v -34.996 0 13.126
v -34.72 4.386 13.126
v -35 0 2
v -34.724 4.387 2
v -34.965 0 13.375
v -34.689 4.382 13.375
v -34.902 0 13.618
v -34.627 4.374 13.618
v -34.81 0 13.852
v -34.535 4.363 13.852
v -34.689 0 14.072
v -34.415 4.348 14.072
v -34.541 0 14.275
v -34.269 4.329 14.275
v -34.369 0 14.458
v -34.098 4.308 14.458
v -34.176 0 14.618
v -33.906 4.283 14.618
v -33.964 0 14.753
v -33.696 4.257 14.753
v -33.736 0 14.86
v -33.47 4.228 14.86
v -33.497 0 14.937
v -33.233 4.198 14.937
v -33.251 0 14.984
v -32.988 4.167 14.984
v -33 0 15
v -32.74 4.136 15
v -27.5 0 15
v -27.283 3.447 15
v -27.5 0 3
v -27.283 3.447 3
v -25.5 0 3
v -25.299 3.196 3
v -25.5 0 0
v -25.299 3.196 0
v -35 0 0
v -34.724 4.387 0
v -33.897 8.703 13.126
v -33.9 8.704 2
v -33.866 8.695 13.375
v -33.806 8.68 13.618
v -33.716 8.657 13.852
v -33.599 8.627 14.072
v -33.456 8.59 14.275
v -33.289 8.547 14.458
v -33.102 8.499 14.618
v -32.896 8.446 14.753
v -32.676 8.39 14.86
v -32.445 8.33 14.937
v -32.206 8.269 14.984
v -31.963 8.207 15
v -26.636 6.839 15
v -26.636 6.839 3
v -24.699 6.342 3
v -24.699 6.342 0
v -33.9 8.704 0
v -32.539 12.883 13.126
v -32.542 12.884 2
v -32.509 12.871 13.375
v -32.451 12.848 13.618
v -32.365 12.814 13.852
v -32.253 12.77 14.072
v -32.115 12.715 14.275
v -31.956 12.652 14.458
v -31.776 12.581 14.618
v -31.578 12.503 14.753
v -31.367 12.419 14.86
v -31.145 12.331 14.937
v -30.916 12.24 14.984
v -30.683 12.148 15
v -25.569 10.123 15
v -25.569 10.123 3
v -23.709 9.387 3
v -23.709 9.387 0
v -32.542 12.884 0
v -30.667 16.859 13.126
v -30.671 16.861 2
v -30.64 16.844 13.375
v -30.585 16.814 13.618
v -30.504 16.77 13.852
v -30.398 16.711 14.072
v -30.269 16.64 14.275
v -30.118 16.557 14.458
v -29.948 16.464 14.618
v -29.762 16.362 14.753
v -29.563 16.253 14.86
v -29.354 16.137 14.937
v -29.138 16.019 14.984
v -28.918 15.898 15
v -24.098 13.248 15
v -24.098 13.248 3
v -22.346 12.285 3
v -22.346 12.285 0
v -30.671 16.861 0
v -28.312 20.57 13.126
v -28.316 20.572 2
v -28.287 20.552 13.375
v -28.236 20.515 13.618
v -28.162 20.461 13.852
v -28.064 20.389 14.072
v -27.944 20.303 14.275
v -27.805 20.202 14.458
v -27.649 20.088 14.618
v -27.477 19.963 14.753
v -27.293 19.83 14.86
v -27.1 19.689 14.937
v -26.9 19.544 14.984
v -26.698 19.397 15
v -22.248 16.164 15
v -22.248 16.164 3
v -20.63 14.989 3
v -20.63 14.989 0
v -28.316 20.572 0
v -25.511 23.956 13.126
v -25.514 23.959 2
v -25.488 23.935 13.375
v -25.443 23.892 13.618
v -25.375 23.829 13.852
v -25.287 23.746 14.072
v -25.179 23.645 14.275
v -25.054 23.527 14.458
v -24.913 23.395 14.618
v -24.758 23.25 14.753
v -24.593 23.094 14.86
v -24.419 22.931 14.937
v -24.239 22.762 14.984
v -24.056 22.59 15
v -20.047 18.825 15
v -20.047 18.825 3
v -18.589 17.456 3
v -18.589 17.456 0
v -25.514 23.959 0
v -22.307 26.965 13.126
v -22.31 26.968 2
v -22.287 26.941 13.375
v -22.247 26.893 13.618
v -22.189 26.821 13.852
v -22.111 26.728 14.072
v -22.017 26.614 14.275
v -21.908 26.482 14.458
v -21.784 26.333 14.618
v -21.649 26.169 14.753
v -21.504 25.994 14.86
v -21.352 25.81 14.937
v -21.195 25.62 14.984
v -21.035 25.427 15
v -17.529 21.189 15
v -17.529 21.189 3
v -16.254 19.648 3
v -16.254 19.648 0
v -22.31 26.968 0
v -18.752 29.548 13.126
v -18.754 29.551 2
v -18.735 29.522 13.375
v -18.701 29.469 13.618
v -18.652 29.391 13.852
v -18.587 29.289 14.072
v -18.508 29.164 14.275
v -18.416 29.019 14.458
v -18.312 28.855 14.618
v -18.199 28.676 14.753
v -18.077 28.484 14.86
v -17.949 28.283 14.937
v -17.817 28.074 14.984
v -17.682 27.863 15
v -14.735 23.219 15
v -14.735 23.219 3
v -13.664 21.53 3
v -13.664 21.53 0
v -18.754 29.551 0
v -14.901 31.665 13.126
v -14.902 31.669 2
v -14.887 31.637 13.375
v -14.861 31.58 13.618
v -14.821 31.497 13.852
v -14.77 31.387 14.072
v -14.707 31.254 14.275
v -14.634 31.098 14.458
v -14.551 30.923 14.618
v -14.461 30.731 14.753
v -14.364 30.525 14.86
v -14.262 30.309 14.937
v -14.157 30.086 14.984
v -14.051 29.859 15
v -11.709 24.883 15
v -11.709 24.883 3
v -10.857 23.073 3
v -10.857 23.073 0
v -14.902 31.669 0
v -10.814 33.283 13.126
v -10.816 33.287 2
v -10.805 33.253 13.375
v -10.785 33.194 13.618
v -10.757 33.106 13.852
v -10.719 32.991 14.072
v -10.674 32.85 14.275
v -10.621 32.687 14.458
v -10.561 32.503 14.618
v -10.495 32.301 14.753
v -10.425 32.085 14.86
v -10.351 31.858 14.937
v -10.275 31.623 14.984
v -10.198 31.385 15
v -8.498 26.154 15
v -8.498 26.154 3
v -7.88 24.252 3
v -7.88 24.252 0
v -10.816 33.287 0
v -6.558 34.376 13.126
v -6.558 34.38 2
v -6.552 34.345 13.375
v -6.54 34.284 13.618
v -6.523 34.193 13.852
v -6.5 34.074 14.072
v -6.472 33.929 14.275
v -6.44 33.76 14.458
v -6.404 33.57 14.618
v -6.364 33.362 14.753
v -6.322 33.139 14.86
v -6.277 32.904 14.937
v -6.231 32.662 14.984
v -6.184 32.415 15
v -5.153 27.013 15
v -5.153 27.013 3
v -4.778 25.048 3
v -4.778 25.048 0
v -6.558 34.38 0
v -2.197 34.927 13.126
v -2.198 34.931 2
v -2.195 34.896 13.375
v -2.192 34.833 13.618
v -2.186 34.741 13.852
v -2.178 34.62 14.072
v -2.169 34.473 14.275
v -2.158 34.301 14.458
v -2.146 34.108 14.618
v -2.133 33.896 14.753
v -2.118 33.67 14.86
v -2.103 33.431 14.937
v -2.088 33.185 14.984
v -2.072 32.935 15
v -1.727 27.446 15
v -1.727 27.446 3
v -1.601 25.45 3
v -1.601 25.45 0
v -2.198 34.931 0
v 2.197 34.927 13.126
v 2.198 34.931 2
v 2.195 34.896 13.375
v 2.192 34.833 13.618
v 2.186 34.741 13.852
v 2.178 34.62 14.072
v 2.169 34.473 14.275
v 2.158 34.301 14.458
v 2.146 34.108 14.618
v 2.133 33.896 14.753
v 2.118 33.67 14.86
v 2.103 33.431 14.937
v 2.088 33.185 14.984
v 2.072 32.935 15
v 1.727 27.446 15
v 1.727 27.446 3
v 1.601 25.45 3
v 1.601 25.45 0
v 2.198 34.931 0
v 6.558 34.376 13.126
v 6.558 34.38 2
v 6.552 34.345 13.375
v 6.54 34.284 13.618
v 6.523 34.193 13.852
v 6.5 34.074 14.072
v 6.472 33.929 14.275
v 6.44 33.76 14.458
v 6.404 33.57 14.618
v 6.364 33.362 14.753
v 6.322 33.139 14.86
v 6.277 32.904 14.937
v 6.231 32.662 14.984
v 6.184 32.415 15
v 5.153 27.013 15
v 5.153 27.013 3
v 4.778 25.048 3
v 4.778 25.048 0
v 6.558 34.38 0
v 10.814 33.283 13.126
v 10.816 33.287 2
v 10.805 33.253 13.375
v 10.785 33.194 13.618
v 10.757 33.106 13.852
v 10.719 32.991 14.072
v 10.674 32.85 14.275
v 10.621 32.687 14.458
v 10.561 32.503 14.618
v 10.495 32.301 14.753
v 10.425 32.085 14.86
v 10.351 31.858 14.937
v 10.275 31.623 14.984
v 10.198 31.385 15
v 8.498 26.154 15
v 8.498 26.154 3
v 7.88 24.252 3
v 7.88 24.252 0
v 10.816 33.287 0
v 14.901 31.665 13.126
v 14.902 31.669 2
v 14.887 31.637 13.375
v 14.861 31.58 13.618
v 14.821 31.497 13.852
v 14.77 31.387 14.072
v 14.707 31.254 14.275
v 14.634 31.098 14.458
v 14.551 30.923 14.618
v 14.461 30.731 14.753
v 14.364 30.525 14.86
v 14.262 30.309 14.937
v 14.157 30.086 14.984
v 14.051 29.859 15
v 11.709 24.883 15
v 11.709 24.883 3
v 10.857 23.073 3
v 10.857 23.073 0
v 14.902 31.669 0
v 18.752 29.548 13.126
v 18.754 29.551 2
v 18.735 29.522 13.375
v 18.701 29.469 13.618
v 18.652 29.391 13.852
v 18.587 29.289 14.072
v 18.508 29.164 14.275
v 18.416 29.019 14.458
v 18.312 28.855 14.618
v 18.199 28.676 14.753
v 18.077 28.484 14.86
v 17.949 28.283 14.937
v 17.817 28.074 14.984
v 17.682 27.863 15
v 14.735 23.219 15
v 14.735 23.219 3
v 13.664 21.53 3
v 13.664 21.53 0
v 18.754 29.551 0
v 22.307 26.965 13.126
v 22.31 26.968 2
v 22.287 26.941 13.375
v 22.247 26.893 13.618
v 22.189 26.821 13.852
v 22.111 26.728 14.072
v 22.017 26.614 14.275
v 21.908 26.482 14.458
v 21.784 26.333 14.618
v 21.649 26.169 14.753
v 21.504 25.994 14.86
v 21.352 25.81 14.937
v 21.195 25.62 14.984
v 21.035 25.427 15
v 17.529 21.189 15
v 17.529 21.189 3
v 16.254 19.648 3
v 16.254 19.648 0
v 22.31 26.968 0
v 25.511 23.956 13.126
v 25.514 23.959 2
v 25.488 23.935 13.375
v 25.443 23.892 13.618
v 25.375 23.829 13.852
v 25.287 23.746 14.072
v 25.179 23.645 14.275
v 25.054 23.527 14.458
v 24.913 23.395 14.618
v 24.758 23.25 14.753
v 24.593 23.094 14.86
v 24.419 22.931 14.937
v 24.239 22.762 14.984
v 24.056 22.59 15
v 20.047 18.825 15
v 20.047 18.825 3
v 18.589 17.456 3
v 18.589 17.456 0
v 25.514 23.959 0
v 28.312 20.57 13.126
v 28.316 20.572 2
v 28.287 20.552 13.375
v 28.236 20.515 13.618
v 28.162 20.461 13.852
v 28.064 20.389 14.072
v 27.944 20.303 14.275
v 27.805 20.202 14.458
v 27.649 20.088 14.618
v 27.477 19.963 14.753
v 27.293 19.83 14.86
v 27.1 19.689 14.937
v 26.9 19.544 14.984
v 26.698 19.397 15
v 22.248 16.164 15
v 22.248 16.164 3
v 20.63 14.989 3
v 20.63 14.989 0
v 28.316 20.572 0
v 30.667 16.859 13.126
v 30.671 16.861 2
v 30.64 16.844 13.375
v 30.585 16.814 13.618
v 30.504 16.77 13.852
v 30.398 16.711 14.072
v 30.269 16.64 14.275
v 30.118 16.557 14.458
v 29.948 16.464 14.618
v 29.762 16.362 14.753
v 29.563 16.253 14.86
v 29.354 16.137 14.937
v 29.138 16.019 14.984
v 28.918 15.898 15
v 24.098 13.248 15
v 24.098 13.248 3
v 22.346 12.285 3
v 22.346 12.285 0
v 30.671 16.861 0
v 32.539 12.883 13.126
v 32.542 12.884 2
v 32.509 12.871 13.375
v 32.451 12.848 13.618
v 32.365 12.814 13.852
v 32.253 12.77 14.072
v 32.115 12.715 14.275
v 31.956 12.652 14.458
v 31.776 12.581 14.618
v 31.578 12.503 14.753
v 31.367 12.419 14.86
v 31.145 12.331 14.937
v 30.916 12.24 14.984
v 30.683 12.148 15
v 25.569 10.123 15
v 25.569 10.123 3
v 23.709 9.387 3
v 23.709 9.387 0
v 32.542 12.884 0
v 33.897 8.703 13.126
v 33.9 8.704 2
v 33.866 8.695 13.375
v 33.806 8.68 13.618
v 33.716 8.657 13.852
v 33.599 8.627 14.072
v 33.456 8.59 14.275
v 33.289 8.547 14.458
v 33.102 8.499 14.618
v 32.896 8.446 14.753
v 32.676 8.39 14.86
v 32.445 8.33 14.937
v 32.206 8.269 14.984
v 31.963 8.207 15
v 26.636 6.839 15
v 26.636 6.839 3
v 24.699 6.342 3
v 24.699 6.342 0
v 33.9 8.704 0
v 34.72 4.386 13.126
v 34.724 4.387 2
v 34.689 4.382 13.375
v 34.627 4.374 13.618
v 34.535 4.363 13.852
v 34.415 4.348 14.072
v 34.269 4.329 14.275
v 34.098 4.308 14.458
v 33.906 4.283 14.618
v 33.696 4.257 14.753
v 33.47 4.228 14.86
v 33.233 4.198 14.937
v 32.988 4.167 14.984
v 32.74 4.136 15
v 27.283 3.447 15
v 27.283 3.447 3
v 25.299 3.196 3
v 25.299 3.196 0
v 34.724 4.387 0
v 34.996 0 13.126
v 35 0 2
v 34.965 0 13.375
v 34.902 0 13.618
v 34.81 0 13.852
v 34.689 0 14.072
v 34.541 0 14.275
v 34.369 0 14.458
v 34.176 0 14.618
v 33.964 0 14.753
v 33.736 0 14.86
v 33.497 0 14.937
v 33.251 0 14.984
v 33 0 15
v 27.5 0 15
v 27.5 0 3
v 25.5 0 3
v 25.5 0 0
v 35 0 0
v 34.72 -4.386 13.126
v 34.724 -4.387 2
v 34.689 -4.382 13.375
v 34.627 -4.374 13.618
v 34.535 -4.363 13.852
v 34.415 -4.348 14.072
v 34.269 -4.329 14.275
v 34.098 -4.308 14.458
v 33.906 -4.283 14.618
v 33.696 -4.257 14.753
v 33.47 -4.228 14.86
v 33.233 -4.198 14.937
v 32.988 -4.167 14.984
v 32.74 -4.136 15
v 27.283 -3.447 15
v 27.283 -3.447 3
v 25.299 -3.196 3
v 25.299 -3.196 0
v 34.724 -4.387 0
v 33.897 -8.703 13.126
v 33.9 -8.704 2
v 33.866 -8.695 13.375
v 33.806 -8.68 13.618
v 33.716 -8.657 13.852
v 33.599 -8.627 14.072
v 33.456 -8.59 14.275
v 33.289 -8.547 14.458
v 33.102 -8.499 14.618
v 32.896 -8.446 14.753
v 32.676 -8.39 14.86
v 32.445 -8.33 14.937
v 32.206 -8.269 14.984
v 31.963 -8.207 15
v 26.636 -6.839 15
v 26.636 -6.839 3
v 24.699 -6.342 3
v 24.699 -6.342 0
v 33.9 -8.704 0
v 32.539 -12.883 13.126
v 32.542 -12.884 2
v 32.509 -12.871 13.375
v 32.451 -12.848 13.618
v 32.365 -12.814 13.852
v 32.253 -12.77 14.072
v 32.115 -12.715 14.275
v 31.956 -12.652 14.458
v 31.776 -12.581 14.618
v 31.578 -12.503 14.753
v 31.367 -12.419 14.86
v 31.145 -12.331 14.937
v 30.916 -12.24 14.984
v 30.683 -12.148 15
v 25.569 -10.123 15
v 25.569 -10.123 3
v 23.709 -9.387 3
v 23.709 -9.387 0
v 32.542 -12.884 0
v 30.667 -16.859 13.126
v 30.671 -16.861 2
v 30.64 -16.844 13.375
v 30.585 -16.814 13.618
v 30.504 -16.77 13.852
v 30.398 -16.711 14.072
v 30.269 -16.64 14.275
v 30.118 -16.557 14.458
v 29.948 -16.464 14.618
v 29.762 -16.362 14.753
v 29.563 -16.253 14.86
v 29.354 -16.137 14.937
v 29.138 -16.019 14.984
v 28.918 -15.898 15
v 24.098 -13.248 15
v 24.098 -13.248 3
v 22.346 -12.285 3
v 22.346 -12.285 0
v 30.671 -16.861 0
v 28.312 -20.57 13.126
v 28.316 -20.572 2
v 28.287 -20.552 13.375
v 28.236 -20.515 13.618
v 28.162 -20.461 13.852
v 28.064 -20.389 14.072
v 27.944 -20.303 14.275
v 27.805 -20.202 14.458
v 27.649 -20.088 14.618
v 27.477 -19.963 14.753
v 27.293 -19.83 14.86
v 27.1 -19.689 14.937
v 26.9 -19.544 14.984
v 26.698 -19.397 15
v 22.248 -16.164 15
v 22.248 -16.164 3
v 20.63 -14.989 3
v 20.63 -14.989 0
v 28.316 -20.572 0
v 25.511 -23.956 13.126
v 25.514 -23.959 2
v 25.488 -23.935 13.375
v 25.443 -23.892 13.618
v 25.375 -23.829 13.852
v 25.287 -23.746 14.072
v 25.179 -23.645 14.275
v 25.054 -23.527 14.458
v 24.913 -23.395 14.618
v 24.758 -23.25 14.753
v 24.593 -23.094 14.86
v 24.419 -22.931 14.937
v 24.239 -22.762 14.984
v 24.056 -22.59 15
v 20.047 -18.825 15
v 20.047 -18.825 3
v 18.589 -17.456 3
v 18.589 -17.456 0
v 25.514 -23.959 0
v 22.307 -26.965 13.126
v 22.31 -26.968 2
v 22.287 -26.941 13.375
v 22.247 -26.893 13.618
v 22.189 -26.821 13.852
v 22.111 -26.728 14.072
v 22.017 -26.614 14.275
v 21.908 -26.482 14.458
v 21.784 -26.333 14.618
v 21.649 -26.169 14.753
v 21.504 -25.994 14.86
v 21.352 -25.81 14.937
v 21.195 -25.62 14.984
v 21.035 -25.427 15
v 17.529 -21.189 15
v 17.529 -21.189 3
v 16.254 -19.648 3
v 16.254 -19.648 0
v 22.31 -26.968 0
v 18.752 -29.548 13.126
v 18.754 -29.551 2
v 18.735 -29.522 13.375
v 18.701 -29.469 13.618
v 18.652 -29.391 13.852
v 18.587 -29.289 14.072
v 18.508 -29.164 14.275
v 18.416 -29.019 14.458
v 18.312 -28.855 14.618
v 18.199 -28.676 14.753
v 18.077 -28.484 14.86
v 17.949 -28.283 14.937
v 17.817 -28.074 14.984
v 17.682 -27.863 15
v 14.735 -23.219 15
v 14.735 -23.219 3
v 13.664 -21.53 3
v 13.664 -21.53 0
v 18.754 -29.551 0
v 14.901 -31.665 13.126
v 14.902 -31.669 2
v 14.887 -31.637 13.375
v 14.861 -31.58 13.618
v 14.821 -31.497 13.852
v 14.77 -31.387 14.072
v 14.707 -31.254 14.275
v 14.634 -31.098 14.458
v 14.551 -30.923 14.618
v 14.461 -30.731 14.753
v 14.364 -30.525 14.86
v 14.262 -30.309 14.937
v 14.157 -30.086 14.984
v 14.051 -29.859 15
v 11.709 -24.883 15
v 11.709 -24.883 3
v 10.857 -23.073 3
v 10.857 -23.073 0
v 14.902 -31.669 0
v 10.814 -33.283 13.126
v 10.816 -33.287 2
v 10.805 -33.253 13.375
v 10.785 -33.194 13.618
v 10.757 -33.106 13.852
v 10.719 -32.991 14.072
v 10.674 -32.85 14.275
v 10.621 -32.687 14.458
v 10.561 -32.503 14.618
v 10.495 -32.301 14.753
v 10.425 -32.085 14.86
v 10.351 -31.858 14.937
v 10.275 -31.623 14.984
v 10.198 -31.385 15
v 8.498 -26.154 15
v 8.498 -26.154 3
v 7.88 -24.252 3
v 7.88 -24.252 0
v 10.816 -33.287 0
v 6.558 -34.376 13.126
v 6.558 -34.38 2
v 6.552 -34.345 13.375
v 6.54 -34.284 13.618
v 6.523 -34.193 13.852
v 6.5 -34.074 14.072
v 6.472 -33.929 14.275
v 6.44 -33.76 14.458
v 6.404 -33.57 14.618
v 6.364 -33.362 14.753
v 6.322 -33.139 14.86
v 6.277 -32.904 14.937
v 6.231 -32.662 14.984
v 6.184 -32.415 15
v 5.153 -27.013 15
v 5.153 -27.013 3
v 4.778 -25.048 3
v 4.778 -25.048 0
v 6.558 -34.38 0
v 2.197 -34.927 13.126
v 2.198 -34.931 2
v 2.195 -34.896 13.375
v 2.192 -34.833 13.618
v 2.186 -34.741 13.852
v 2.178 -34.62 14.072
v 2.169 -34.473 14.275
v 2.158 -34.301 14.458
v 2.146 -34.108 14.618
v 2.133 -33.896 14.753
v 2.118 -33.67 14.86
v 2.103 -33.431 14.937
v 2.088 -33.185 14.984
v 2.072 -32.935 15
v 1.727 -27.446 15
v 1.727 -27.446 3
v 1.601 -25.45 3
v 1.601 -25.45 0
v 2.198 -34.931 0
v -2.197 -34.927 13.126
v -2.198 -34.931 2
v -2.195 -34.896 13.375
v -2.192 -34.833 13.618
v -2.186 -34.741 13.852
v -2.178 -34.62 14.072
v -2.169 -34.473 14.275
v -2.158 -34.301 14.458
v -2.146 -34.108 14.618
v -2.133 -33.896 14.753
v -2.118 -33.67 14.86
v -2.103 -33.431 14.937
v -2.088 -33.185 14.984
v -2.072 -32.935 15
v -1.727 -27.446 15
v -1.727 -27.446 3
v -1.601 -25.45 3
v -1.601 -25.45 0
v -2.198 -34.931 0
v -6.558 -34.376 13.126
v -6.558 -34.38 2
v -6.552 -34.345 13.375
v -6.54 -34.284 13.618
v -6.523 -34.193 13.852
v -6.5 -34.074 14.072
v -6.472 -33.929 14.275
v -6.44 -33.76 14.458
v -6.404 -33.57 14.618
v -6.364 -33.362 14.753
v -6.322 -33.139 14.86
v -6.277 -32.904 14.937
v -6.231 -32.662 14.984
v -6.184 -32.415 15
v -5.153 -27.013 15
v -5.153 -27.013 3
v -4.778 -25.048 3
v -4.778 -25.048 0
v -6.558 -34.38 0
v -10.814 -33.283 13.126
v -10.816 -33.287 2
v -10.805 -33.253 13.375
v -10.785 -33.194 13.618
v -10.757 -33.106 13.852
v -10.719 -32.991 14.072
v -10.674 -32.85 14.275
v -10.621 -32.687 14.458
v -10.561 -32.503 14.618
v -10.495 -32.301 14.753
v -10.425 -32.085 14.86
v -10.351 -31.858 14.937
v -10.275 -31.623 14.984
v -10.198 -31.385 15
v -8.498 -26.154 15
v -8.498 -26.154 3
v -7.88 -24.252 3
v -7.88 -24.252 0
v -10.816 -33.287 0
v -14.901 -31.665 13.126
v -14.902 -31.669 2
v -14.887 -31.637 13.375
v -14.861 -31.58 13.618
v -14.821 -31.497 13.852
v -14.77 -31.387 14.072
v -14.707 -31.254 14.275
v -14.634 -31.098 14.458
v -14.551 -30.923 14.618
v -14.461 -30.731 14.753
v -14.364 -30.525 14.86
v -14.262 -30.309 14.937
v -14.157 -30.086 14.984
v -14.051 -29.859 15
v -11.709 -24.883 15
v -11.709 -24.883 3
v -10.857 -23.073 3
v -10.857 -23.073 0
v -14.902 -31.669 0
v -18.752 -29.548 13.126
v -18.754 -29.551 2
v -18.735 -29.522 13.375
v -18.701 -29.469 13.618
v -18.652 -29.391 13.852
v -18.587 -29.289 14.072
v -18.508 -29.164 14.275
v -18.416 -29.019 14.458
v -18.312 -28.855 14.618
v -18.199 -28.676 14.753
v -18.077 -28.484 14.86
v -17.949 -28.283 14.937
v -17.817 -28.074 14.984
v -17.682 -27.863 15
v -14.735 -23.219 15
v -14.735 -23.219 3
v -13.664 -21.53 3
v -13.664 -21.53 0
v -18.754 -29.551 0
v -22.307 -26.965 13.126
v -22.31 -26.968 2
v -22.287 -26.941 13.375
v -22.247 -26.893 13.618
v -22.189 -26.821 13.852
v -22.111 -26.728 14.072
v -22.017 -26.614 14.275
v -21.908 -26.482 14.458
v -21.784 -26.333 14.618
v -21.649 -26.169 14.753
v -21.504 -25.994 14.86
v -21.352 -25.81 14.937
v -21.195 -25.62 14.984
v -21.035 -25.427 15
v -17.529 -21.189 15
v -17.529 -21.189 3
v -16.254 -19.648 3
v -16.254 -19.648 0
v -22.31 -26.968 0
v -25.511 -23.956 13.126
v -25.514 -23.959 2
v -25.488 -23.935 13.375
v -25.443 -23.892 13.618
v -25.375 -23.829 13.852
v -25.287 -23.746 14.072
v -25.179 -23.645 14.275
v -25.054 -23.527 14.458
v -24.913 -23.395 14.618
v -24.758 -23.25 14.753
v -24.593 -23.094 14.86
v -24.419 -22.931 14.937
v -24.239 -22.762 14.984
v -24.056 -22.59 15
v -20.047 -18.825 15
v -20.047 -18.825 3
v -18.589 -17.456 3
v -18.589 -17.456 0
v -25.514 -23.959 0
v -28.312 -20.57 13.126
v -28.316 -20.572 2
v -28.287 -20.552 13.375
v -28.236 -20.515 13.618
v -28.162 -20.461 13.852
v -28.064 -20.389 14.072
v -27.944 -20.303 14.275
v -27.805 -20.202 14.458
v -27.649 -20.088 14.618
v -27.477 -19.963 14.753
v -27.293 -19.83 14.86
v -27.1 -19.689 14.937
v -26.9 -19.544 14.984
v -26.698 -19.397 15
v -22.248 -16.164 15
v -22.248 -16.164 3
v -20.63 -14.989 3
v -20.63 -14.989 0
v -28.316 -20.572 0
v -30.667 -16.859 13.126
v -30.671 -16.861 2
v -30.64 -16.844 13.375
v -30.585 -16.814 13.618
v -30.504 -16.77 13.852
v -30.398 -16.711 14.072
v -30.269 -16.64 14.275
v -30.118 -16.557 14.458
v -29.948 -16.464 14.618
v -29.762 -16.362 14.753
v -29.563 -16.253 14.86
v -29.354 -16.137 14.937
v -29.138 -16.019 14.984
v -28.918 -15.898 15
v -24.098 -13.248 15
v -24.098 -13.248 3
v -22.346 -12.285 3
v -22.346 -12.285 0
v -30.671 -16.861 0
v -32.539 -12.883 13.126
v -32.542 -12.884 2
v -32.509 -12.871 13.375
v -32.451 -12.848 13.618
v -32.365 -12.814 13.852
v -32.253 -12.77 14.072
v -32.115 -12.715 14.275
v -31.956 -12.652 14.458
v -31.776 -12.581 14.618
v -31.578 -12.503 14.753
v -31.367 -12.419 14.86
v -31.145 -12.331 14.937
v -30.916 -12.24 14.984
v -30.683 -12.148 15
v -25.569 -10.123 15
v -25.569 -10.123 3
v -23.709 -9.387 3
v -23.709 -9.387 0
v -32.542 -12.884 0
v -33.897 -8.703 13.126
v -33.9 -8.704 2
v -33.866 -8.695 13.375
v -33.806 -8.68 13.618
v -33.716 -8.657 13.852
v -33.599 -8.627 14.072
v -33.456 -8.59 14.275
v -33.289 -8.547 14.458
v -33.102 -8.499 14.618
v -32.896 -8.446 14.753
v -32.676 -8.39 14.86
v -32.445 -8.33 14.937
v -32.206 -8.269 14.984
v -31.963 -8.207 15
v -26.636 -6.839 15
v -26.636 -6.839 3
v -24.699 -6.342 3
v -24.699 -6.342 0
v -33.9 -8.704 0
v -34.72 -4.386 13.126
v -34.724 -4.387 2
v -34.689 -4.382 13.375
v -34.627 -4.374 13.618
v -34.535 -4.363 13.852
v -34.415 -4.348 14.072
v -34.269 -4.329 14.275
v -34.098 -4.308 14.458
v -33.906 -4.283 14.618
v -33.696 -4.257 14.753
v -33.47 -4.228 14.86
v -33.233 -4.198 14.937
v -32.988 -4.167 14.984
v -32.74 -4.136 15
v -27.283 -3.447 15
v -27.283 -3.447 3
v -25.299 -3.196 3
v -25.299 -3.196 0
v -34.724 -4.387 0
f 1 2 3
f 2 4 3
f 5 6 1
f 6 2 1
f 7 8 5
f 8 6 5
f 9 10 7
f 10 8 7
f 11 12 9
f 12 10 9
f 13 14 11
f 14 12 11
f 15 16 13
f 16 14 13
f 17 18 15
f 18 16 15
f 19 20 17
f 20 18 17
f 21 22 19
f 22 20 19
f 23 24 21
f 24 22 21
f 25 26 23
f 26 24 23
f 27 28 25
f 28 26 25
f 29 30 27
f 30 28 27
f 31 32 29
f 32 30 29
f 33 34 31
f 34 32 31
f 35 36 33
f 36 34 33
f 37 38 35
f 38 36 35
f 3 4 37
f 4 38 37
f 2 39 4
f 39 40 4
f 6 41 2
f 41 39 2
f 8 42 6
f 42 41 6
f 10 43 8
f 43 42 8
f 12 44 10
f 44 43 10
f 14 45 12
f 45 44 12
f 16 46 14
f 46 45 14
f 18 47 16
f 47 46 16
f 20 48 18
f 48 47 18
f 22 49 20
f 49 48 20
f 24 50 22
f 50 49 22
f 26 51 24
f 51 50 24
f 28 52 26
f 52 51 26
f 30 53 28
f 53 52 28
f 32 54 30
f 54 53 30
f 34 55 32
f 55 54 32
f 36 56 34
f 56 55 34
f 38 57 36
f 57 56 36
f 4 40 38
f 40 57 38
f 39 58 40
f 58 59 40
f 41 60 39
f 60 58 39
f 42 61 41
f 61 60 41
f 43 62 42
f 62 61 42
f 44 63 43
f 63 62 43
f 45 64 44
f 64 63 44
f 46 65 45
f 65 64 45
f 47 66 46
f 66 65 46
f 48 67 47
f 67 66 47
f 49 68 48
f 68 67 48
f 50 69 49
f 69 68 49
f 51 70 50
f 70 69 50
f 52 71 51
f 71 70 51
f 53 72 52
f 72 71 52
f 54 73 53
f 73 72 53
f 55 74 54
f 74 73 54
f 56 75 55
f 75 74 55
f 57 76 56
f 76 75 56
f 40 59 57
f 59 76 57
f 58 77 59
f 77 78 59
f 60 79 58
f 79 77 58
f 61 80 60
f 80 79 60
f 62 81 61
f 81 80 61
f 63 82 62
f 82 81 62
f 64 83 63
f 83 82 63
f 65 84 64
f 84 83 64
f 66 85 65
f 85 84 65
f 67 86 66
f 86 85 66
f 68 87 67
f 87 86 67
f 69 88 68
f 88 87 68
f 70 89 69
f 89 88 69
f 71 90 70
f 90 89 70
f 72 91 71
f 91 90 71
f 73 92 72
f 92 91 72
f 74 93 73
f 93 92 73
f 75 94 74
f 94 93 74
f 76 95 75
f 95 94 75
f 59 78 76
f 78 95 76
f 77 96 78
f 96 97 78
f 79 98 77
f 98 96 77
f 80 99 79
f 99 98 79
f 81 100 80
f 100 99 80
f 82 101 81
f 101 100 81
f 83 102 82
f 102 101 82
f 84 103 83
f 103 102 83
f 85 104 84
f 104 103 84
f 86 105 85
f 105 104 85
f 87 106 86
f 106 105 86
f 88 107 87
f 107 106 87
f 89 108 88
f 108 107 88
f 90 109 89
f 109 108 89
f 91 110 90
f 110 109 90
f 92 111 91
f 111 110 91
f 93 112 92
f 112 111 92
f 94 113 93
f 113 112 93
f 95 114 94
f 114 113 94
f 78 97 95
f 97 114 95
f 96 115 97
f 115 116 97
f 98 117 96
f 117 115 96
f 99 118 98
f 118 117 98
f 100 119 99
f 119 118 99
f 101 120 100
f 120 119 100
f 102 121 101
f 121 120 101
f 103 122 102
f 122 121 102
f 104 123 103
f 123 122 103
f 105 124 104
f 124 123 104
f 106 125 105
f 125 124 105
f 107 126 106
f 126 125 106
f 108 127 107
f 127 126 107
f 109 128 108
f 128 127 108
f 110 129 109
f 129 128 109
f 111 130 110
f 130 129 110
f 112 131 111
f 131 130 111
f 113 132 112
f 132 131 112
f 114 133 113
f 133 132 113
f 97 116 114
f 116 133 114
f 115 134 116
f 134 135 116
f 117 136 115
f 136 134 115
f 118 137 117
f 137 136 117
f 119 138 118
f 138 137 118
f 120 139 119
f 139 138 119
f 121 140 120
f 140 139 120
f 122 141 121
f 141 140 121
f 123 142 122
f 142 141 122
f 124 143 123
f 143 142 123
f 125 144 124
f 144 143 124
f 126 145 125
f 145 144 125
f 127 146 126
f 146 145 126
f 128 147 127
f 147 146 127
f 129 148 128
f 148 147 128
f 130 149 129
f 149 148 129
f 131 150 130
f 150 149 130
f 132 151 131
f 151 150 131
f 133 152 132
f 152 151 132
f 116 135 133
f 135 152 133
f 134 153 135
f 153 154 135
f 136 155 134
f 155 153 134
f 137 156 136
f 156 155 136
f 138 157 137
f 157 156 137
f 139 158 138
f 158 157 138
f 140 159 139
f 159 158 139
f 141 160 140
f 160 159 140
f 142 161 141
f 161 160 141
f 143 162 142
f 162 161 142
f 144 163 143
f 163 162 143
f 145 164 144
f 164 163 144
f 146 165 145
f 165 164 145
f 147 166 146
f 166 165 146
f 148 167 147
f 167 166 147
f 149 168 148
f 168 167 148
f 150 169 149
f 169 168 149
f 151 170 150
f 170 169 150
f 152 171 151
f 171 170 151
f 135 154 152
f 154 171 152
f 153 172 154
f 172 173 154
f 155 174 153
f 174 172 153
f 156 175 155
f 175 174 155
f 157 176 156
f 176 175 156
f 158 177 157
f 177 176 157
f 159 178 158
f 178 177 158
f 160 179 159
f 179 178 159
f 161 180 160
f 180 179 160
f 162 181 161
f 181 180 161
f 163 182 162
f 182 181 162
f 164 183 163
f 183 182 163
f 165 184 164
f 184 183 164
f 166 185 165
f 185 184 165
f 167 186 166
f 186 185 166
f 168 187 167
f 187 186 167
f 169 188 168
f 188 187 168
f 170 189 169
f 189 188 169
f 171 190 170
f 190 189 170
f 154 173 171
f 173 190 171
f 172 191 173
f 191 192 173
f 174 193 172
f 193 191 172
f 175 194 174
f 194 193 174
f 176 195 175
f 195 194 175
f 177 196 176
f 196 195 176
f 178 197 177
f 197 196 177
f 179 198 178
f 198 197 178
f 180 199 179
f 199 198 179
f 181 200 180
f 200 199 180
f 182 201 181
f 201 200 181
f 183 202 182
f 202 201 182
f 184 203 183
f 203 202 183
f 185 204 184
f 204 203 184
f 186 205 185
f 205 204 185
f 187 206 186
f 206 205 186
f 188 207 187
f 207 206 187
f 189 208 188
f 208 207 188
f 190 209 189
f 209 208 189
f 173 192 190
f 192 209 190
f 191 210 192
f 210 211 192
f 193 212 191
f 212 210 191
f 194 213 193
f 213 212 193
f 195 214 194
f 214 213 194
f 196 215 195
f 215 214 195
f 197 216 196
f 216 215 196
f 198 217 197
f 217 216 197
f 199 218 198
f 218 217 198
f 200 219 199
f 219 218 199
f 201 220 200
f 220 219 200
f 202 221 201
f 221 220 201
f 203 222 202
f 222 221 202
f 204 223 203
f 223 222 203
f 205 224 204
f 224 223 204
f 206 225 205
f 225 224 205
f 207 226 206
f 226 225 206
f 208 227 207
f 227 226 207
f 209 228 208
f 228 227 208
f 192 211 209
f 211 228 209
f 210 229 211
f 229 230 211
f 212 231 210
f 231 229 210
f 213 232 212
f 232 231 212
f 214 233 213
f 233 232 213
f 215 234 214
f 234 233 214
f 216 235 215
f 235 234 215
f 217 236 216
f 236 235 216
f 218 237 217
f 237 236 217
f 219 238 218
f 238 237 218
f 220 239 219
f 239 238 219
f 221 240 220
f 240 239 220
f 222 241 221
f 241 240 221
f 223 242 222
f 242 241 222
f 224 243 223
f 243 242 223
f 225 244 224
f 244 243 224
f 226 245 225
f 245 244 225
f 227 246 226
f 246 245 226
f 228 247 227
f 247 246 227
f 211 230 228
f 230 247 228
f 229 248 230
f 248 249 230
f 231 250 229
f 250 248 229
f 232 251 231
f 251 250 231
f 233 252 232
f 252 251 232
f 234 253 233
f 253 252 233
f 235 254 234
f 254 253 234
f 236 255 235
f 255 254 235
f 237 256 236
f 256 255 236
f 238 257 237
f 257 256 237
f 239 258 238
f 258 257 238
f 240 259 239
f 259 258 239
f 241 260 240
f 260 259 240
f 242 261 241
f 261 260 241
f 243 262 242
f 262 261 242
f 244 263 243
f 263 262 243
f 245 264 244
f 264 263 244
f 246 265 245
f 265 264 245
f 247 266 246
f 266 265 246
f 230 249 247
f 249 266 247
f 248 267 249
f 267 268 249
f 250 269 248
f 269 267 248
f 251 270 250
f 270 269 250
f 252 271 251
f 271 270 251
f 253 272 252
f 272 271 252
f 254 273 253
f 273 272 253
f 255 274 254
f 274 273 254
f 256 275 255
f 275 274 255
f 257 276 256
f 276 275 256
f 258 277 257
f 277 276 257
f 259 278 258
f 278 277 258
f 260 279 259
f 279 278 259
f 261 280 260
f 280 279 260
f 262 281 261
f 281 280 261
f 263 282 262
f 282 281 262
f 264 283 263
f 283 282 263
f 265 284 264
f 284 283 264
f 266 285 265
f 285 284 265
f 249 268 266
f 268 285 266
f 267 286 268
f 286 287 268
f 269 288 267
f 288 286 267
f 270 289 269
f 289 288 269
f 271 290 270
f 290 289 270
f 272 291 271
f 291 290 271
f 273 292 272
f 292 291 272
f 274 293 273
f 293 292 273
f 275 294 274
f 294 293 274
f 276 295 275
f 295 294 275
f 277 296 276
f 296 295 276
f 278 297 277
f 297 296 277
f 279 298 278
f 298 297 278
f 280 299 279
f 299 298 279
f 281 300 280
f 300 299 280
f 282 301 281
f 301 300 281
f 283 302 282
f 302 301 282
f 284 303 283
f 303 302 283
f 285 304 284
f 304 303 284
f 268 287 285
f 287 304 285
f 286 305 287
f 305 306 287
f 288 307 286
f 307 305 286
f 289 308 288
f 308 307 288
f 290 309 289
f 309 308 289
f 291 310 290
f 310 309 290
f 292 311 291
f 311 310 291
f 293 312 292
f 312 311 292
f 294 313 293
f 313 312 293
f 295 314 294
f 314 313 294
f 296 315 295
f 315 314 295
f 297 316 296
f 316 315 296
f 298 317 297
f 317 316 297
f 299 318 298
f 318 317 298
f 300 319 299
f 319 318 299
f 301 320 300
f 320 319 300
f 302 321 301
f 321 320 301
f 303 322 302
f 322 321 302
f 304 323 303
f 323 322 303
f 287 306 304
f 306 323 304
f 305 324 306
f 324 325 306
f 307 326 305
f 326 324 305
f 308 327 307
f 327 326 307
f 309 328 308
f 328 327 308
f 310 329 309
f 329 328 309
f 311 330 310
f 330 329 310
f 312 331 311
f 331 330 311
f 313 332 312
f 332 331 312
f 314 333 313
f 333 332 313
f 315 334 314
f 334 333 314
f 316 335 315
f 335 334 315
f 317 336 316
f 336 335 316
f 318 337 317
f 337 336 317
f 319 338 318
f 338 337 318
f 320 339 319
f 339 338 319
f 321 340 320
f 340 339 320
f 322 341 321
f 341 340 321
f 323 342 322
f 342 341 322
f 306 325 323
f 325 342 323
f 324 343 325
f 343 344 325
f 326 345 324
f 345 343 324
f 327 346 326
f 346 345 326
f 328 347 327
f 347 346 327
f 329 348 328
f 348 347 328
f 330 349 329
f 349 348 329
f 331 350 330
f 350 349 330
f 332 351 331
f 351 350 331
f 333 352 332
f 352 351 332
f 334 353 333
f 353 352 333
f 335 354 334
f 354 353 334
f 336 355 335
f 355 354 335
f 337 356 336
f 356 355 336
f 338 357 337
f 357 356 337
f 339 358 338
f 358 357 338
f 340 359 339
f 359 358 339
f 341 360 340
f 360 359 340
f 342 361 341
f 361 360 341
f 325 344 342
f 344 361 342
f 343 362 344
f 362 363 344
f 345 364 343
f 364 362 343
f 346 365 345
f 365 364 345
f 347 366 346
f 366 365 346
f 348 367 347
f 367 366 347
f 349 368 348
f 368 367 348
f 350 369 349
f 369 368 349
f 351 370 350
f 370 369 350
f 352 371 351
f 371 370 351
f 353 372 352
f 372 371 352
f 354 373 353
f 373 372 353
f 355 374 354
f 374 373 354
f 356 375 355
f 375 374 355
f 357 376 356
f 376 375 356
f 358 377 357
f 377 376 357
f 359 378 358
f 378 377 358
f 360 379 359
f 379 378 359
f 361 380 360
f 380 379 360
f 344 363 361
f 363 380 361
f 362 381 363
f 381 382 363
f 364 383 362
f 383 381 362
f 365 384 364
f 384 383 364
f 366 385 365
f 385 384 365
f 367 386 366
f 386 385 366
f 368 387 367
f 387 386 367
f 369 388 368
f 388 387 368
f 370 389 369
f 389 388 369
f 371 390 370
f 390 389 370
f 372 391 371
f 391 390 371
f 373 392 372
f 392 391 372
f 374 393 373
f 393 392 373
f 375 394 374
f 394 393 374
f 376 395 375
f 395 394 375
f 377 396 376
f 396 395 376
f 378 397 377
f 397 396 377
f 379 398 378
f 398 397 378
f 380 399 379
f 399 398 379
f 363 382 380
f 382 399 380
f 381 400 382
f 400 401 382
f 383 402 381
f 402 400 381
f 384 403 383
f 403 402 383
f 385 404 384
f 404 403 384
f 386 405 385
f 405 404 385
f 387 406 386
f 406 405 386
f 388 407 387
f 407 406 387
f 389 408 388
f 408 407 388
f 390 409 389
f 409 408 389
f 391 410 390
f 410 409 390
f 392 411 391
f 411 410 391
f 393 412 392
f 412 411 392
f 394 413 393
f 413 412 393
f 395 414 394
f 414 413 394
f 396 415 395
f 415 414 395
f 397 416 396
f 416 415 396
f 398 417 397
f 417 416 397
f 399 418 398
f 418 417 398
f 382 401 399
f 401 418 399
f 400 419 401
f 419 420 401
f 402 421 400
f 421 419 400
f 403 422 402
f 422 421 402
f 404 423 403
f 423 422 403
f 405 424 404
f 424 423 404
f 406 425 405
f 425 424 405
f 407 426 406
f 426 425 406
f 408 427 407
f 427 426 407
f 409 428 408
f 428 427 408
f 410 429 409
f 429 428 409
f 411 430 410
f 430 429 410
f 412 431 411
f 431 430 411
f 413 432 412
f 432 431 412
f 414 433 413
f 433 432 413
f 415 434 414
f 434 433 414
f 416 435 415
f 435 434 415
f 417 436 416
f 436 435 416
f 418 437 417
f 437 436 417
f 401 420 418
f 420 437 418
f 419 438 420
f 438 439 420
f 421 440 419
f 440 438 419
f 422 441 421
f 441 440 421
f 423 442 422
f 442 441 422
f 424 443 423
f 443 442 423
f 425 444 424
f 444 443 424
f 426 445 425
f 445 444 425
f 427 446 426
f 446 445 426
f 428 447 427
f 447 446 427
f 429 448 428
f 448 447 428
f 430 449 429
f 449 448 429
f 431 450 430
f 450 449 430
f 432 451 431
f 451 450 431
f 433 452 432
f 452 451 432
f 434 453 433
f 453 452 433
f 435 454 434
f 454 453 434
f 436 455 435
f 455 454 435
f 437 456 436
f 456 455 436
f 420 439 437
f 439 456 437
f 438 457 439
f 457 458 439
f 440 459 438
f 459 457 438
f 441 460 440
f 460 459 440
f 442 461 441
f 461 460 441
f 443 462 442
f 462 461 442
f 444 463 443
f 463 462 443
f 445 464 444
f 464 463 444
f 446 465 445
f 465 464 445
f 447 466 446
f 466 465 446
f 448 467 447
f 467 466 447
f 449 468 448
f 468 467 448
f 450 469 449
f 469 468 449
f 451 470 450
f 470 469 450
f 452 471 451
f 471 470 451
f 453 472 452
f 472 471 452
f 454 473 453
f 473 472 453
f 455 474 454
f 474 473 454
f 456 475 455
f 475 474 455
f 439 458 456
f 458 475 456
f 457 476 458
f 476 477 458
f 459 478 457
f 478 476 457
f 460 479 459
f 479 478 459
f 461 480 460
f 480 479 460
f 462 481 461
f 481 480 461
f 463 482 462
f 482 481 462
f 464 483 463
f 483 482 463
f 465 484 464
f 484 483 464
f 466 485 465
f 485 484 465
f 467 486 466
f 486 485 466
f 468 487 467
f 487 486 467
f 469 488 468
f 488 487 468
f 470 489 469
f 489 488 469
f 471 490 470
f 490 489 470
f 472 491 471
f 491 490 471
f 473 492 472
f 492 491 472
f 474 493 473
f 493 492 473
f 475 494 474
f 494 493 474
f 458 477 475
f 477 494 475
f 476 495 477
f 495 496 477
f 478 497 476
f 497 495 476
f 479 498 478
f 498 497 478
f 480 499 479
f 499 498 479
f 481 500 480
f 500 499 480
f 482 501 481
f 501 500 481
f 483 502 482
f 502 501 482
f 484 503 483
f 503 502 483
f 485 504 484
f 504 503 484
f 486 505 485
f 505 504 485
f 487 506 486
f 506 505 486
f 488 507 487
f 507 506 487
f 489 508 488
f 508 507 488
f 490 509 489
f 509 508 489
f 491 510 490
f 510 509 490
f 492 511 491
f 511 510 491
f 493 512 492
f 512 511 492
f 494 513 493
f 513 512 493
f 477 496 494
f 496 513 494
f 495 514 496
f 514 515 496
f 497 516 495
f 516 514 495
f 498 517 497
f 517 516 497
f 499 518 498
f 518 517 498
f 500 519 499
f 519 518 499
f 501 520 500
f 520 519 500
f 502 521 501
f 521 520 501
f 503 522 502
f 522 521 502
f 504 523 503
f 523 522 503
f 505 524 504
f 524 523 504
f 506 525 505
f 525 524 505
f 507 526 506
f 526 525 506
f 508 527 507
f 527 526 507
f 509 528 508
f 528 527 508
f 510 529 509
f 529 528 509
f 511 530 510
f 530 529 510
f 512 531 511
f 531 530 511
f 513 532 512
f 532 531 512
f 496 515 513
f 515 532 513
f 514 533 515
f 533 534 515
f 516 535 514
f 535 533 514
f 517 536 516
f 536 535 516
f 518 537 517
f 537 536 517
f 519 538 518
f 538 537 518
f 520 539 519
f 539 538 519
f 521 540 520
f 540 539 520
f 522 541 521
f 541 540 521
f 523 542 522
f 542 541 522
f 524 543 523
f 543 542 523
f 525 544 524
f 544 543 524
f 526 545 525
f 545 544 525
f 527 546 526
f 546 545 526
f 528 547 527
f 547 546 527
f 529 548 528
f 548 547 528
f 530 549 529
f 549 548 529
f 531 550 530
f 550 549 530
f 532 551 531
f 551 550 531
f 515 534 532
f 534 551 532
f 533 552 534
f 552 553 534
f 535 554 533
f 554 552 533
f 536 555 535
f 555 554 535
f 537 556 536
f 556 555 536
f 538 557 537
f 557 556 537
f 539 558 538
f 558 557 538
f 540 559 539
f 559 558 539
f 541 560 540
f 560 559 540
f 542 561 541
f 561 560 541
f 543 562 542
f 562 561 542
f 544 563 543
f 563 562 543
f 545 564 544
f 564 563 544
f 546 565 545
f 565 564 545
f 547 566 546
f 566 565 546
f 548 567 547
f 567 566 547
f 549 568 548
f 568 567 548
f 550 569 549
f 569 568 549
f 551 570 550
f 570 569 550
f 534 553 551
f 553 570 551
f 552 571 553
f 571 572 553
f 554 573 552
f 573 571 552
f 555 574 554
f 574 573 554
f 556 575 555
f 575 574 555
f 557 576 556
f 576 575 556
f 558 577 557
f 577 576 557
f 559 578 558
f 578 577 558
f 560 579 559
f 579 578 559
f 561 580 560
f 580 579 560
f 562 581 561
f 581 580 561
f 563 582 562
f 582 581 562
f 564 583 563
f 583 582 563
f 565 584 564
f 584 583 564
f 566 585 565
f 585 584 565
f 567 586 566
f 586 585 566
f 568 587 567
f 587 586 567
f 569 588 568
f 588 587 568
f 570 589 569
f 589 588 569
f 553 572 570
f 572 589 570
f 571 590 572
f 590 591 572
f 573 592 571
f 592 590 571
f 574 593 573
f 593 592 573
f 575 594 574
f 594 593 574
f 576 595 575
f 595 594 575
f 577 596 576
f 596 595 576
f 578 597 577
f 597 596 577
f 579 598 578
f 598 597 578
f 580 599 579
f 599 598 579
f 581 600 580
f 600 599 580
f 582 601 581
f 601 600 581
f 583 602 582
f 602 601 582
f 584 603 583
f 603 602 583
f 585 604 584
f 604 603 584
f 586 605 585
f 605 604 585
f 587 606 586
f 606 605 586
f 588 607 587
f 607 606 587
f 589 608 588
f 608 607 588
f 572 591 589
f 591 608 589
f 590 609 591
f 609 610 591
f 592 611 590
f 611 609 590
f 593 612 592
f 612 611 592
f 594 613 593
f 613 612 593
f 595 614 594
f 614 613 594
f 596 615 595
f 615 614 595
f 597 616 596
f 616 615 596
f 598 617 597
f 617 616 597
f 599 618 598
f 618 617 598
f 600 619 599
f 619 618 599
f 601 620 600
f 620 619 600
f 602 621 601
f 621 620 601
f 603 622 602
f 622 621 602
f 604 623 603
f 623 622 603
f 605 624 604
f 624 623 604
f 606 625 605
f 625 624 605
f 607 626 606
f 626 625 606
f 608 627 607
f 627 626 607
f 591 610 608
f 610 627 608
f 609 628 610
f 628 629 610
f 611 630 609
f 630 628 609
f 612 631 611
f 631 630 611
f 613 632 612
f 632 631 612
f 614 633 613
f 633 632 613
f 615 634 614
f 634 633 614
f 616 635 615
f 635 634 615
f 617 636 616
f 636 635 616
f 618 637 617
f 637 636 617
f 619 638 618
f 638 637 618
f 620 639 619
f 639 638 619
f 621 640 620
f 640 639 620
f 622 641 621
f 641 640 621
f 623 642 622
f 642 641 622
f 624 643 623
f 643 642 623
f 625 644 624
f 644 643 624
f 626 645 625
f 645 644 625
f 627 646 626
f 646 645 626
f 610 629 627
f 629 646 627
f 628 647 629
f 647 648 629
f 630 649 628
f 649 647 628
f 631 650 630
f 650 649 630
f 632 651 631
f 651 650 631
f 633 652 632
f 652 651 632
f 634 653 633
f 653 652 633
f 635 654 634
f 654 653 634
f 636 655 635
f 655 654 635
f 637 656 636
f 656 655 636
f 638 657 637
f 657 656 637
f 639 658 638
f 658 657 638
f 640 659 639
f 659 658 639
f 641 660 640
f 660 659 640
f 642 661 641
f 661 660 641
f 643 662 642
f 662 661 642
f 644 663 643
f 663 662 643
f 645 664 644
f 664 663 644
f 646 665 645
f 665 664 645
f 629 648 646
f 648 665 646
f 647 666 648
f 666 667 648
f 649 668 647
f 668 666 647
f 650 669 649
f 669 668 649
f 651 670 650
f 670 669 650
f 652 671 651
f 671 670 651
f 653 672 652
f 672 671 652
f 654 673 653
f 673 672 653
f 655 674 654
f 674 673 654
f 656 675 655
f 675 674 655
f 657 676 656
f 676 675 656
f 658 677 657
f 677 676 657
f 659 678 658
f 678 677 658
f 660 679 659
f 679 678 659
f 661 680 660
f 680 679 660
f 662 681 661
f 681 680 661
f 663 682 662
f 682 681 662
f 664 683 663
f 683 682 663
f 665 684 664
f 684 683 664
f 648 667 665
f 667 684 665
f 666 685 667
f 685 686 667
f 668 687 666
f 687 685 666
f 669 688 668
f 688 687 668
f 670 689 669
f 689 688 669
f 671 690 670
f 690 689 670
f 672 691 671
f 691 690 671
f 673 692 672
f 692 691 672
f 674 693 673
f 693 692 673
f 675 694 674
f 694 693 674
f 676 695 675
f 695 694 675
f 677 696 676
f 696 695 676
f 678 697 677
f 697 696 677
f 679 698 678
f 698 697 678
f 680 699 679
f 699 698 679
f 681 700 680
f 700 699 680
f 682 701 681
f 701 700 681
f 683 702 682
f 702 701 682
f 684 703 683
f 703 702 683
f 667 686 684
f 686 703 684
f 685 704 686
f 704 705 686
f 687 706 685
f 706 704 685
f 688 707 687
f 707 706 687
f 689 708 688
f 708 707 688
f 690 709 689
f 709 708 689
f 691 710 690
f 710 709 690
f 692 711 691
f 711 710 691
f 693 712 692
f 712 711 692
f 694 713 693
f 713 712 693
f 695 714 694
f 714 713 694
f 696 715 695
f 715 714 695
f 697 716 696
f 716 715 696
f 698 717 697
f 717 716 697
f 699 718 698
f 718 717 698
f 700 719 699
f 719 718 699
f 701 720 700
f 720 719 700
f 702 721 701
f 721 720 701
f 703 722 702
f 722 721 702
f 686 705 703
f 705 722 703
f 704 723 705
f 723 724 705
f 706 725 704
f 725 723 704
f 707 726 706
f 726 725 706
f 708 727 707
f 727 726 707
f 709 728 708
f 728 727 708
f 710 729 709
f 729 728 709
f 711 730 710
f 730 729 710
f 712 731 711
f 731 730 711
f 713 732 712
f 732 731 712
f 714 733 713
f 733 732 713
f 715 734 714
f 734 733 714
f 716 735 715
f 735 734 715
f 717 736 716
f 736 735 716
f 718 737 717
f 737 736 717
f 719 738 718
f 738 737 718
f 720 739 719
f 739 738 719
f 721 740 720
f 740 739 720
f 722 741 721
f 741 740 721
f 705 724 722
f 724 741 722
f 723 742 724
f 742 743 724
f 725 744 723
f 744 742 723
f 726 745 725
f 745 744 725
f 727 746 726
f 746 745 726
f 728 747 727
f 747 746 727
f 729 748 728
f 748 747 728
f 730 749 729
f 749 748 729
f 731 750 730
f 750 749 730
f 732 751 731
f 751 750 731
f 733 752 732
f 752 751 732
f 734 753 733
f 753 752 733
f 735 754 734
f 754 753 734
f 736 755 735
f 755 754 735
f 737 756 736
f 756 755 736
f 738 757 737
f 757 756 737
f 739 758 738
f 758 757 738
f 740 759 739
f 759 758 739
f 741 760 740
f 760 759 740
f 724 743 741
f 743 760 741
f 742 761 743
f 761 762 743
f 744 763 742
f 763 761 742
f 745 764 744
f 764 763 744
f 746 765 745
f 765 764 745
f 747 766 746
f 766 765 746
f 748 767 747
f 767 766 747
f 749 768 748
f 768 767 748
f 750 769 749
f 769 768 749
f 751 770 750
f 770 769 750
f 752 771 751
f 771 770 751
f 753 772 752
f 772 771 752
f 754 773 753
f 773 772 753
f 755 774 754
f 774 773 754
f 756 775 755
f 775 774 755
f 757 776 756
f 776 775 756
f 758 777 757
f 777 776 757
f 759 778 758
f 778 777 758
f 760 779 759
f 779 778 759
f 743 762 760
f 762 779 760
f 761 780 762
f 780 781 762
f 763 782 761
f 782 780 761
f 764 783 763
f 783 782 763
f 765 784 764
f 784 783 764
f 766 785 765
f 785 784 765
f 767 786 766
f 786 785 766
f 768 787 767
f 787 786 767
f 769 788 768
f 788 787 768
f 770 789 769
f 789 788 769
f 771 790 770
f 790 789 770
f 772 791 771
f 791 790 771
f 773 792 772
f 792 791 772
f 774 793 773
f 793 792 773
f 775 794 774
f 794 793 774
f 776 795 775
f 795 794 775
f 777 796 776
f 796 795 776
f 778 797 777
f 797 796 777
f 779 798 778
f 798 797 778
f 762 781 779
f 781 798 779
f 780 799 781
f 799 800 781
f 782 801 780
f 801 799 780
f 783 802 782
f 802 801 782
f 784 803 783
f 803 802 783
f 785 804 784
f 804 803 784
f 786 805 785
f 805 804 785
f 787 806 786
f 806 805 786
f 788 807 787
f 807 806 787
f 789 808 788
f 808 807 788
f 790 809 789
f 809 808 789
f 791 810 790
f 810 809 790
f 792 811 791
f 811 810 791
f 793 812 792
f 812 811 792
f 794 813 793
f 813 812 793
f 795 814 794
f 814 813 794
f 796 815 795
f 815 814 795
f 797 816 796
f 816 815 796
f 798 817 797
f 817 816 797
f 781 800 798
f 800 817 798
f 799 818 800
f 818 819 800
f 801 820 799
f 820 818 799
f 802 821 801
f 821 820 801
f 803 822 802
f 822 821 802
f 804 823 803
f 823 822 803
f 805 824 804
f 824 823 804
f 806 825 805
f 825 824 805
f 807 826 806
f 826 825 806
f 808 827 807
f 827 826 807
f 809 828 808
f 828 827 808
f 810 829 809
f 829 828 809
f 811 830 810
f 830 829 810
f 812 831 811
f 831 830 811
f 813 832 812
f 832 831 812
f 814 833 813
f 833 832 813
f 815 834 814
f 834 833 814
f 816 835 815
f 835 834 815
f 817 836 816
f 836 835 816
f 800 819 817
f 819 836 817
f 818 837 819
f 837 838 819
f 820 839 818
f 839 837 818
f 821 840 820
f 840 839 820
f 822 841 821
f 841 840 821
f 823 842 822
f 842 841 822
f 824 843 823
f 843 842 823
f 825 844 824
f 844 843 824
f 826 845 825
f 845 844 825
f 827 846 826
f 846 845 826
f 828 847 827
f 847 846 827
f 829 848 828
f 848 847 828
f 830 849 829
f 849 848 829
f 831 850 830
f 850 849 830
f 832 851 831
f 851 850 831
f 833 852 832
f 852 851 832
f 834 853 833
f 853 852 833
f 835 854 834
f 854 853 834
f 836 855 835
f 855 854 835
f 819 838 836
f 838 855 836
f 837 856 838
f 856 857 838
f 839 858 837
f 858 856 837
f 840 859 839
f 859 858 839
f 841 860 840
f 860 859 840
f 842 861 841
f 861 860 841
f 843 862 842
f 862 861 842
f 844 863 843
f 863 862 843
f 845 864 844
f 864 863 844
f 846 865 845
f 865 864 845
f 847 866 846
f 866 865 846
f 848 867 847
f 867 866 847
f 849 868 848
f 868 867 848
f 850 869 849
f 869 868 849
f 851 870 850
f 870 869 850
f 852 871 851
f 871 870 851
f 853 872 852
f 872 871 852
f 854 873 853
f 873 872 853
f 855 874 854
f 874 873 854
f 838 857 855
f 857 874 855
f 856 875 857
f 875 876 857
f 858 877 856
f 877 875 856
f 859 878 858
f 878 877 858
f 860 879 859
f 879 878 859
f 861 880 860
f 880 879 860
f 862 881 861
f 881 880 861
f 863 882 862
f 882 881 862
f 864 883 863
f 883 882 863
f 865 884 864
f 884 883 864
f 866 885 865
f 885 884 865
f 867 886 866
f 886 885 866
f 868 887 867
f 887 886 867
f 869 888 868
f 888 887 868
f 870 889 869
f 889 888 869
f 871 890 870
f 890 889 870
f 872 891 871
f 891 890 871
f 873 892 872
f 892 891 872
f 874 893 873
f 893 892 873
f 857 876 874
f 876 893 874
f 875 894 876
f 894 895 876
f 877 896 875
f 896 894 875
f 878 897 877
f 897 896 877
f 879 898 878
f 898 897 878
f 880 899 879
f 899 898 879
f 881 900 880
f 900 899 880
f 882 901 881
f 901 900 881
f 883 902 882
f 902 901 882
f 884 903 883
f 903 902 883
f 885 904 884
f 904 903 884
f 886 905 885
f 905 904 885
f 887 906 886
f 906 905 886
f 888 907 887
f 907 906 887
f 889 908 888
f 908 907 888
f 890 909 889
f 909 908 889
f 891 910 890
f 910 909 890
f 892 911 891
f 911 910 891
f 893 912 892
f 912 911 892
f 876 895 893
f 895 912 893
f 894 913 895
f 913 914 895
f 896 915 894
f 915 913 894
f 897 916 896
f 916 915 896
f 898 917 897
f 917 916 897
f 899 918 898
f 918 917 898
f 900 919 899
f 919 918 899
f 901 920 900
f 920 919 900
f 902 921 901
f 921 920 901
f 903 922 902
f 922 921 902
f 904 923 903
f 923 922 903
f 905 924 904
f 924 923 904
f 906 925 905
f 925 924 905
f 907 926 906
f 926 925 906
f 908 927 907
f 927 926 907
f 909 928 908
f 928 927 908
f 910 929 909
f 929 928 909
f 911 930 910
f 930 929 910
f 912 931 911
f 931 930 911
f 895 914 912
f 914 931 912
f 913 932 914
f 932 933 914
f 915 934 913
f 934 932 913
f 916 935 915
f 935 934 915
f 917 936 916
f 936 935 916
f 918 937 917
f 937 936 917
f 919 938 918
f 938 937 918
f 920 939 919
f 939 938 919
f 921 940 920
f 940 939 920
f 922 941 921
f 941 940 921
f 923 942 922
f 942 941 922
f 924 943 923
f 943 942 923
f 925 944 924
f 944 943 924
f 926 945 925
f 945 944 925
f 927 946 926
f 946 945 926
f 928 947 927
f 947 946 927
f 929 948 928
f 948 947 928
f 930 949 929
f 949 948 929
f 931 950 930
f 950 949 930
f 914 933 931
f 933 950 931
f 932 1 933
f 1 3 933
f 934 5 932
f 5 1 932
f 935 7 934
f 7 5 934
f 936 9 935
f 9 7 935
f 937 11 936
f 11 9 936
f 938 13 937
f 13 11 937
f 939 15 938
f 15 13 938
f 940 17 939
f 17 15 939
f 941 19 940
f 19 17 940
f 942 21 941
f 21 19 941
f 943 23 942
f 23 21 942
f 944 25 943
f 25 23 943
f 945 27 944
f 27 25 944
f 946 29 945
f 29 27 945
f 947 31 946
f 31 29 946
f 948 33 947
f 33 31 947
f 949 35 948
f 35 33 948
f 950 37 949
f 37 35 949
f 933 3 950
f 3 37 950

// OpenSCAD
// This work is licensed under a Creative Commons Attribution-ShareAlike 4.0
// International License (http://creativecommons.org/licenses/by-sa/4.0/)

w = 15;
od = 70;
id = 55;
sw = 3;
sh = 2;
r = 2;
$fn = 50;

th = (od - id)/2;

module profile() {
    hull() {
        translate([0, r, 0]) square([w, th - r]);
        //translate([r, r, 0]) circle(r=r);
        square(r);
        translate([w - r, r, 0]) circle(r=r);
    }
    translate([0, th - 0.0001, 0]) square([sw, sh]);
}

rotate_extrude() translate([od/2, 0, 0]) rotate([0, 0, 90]) profile();
